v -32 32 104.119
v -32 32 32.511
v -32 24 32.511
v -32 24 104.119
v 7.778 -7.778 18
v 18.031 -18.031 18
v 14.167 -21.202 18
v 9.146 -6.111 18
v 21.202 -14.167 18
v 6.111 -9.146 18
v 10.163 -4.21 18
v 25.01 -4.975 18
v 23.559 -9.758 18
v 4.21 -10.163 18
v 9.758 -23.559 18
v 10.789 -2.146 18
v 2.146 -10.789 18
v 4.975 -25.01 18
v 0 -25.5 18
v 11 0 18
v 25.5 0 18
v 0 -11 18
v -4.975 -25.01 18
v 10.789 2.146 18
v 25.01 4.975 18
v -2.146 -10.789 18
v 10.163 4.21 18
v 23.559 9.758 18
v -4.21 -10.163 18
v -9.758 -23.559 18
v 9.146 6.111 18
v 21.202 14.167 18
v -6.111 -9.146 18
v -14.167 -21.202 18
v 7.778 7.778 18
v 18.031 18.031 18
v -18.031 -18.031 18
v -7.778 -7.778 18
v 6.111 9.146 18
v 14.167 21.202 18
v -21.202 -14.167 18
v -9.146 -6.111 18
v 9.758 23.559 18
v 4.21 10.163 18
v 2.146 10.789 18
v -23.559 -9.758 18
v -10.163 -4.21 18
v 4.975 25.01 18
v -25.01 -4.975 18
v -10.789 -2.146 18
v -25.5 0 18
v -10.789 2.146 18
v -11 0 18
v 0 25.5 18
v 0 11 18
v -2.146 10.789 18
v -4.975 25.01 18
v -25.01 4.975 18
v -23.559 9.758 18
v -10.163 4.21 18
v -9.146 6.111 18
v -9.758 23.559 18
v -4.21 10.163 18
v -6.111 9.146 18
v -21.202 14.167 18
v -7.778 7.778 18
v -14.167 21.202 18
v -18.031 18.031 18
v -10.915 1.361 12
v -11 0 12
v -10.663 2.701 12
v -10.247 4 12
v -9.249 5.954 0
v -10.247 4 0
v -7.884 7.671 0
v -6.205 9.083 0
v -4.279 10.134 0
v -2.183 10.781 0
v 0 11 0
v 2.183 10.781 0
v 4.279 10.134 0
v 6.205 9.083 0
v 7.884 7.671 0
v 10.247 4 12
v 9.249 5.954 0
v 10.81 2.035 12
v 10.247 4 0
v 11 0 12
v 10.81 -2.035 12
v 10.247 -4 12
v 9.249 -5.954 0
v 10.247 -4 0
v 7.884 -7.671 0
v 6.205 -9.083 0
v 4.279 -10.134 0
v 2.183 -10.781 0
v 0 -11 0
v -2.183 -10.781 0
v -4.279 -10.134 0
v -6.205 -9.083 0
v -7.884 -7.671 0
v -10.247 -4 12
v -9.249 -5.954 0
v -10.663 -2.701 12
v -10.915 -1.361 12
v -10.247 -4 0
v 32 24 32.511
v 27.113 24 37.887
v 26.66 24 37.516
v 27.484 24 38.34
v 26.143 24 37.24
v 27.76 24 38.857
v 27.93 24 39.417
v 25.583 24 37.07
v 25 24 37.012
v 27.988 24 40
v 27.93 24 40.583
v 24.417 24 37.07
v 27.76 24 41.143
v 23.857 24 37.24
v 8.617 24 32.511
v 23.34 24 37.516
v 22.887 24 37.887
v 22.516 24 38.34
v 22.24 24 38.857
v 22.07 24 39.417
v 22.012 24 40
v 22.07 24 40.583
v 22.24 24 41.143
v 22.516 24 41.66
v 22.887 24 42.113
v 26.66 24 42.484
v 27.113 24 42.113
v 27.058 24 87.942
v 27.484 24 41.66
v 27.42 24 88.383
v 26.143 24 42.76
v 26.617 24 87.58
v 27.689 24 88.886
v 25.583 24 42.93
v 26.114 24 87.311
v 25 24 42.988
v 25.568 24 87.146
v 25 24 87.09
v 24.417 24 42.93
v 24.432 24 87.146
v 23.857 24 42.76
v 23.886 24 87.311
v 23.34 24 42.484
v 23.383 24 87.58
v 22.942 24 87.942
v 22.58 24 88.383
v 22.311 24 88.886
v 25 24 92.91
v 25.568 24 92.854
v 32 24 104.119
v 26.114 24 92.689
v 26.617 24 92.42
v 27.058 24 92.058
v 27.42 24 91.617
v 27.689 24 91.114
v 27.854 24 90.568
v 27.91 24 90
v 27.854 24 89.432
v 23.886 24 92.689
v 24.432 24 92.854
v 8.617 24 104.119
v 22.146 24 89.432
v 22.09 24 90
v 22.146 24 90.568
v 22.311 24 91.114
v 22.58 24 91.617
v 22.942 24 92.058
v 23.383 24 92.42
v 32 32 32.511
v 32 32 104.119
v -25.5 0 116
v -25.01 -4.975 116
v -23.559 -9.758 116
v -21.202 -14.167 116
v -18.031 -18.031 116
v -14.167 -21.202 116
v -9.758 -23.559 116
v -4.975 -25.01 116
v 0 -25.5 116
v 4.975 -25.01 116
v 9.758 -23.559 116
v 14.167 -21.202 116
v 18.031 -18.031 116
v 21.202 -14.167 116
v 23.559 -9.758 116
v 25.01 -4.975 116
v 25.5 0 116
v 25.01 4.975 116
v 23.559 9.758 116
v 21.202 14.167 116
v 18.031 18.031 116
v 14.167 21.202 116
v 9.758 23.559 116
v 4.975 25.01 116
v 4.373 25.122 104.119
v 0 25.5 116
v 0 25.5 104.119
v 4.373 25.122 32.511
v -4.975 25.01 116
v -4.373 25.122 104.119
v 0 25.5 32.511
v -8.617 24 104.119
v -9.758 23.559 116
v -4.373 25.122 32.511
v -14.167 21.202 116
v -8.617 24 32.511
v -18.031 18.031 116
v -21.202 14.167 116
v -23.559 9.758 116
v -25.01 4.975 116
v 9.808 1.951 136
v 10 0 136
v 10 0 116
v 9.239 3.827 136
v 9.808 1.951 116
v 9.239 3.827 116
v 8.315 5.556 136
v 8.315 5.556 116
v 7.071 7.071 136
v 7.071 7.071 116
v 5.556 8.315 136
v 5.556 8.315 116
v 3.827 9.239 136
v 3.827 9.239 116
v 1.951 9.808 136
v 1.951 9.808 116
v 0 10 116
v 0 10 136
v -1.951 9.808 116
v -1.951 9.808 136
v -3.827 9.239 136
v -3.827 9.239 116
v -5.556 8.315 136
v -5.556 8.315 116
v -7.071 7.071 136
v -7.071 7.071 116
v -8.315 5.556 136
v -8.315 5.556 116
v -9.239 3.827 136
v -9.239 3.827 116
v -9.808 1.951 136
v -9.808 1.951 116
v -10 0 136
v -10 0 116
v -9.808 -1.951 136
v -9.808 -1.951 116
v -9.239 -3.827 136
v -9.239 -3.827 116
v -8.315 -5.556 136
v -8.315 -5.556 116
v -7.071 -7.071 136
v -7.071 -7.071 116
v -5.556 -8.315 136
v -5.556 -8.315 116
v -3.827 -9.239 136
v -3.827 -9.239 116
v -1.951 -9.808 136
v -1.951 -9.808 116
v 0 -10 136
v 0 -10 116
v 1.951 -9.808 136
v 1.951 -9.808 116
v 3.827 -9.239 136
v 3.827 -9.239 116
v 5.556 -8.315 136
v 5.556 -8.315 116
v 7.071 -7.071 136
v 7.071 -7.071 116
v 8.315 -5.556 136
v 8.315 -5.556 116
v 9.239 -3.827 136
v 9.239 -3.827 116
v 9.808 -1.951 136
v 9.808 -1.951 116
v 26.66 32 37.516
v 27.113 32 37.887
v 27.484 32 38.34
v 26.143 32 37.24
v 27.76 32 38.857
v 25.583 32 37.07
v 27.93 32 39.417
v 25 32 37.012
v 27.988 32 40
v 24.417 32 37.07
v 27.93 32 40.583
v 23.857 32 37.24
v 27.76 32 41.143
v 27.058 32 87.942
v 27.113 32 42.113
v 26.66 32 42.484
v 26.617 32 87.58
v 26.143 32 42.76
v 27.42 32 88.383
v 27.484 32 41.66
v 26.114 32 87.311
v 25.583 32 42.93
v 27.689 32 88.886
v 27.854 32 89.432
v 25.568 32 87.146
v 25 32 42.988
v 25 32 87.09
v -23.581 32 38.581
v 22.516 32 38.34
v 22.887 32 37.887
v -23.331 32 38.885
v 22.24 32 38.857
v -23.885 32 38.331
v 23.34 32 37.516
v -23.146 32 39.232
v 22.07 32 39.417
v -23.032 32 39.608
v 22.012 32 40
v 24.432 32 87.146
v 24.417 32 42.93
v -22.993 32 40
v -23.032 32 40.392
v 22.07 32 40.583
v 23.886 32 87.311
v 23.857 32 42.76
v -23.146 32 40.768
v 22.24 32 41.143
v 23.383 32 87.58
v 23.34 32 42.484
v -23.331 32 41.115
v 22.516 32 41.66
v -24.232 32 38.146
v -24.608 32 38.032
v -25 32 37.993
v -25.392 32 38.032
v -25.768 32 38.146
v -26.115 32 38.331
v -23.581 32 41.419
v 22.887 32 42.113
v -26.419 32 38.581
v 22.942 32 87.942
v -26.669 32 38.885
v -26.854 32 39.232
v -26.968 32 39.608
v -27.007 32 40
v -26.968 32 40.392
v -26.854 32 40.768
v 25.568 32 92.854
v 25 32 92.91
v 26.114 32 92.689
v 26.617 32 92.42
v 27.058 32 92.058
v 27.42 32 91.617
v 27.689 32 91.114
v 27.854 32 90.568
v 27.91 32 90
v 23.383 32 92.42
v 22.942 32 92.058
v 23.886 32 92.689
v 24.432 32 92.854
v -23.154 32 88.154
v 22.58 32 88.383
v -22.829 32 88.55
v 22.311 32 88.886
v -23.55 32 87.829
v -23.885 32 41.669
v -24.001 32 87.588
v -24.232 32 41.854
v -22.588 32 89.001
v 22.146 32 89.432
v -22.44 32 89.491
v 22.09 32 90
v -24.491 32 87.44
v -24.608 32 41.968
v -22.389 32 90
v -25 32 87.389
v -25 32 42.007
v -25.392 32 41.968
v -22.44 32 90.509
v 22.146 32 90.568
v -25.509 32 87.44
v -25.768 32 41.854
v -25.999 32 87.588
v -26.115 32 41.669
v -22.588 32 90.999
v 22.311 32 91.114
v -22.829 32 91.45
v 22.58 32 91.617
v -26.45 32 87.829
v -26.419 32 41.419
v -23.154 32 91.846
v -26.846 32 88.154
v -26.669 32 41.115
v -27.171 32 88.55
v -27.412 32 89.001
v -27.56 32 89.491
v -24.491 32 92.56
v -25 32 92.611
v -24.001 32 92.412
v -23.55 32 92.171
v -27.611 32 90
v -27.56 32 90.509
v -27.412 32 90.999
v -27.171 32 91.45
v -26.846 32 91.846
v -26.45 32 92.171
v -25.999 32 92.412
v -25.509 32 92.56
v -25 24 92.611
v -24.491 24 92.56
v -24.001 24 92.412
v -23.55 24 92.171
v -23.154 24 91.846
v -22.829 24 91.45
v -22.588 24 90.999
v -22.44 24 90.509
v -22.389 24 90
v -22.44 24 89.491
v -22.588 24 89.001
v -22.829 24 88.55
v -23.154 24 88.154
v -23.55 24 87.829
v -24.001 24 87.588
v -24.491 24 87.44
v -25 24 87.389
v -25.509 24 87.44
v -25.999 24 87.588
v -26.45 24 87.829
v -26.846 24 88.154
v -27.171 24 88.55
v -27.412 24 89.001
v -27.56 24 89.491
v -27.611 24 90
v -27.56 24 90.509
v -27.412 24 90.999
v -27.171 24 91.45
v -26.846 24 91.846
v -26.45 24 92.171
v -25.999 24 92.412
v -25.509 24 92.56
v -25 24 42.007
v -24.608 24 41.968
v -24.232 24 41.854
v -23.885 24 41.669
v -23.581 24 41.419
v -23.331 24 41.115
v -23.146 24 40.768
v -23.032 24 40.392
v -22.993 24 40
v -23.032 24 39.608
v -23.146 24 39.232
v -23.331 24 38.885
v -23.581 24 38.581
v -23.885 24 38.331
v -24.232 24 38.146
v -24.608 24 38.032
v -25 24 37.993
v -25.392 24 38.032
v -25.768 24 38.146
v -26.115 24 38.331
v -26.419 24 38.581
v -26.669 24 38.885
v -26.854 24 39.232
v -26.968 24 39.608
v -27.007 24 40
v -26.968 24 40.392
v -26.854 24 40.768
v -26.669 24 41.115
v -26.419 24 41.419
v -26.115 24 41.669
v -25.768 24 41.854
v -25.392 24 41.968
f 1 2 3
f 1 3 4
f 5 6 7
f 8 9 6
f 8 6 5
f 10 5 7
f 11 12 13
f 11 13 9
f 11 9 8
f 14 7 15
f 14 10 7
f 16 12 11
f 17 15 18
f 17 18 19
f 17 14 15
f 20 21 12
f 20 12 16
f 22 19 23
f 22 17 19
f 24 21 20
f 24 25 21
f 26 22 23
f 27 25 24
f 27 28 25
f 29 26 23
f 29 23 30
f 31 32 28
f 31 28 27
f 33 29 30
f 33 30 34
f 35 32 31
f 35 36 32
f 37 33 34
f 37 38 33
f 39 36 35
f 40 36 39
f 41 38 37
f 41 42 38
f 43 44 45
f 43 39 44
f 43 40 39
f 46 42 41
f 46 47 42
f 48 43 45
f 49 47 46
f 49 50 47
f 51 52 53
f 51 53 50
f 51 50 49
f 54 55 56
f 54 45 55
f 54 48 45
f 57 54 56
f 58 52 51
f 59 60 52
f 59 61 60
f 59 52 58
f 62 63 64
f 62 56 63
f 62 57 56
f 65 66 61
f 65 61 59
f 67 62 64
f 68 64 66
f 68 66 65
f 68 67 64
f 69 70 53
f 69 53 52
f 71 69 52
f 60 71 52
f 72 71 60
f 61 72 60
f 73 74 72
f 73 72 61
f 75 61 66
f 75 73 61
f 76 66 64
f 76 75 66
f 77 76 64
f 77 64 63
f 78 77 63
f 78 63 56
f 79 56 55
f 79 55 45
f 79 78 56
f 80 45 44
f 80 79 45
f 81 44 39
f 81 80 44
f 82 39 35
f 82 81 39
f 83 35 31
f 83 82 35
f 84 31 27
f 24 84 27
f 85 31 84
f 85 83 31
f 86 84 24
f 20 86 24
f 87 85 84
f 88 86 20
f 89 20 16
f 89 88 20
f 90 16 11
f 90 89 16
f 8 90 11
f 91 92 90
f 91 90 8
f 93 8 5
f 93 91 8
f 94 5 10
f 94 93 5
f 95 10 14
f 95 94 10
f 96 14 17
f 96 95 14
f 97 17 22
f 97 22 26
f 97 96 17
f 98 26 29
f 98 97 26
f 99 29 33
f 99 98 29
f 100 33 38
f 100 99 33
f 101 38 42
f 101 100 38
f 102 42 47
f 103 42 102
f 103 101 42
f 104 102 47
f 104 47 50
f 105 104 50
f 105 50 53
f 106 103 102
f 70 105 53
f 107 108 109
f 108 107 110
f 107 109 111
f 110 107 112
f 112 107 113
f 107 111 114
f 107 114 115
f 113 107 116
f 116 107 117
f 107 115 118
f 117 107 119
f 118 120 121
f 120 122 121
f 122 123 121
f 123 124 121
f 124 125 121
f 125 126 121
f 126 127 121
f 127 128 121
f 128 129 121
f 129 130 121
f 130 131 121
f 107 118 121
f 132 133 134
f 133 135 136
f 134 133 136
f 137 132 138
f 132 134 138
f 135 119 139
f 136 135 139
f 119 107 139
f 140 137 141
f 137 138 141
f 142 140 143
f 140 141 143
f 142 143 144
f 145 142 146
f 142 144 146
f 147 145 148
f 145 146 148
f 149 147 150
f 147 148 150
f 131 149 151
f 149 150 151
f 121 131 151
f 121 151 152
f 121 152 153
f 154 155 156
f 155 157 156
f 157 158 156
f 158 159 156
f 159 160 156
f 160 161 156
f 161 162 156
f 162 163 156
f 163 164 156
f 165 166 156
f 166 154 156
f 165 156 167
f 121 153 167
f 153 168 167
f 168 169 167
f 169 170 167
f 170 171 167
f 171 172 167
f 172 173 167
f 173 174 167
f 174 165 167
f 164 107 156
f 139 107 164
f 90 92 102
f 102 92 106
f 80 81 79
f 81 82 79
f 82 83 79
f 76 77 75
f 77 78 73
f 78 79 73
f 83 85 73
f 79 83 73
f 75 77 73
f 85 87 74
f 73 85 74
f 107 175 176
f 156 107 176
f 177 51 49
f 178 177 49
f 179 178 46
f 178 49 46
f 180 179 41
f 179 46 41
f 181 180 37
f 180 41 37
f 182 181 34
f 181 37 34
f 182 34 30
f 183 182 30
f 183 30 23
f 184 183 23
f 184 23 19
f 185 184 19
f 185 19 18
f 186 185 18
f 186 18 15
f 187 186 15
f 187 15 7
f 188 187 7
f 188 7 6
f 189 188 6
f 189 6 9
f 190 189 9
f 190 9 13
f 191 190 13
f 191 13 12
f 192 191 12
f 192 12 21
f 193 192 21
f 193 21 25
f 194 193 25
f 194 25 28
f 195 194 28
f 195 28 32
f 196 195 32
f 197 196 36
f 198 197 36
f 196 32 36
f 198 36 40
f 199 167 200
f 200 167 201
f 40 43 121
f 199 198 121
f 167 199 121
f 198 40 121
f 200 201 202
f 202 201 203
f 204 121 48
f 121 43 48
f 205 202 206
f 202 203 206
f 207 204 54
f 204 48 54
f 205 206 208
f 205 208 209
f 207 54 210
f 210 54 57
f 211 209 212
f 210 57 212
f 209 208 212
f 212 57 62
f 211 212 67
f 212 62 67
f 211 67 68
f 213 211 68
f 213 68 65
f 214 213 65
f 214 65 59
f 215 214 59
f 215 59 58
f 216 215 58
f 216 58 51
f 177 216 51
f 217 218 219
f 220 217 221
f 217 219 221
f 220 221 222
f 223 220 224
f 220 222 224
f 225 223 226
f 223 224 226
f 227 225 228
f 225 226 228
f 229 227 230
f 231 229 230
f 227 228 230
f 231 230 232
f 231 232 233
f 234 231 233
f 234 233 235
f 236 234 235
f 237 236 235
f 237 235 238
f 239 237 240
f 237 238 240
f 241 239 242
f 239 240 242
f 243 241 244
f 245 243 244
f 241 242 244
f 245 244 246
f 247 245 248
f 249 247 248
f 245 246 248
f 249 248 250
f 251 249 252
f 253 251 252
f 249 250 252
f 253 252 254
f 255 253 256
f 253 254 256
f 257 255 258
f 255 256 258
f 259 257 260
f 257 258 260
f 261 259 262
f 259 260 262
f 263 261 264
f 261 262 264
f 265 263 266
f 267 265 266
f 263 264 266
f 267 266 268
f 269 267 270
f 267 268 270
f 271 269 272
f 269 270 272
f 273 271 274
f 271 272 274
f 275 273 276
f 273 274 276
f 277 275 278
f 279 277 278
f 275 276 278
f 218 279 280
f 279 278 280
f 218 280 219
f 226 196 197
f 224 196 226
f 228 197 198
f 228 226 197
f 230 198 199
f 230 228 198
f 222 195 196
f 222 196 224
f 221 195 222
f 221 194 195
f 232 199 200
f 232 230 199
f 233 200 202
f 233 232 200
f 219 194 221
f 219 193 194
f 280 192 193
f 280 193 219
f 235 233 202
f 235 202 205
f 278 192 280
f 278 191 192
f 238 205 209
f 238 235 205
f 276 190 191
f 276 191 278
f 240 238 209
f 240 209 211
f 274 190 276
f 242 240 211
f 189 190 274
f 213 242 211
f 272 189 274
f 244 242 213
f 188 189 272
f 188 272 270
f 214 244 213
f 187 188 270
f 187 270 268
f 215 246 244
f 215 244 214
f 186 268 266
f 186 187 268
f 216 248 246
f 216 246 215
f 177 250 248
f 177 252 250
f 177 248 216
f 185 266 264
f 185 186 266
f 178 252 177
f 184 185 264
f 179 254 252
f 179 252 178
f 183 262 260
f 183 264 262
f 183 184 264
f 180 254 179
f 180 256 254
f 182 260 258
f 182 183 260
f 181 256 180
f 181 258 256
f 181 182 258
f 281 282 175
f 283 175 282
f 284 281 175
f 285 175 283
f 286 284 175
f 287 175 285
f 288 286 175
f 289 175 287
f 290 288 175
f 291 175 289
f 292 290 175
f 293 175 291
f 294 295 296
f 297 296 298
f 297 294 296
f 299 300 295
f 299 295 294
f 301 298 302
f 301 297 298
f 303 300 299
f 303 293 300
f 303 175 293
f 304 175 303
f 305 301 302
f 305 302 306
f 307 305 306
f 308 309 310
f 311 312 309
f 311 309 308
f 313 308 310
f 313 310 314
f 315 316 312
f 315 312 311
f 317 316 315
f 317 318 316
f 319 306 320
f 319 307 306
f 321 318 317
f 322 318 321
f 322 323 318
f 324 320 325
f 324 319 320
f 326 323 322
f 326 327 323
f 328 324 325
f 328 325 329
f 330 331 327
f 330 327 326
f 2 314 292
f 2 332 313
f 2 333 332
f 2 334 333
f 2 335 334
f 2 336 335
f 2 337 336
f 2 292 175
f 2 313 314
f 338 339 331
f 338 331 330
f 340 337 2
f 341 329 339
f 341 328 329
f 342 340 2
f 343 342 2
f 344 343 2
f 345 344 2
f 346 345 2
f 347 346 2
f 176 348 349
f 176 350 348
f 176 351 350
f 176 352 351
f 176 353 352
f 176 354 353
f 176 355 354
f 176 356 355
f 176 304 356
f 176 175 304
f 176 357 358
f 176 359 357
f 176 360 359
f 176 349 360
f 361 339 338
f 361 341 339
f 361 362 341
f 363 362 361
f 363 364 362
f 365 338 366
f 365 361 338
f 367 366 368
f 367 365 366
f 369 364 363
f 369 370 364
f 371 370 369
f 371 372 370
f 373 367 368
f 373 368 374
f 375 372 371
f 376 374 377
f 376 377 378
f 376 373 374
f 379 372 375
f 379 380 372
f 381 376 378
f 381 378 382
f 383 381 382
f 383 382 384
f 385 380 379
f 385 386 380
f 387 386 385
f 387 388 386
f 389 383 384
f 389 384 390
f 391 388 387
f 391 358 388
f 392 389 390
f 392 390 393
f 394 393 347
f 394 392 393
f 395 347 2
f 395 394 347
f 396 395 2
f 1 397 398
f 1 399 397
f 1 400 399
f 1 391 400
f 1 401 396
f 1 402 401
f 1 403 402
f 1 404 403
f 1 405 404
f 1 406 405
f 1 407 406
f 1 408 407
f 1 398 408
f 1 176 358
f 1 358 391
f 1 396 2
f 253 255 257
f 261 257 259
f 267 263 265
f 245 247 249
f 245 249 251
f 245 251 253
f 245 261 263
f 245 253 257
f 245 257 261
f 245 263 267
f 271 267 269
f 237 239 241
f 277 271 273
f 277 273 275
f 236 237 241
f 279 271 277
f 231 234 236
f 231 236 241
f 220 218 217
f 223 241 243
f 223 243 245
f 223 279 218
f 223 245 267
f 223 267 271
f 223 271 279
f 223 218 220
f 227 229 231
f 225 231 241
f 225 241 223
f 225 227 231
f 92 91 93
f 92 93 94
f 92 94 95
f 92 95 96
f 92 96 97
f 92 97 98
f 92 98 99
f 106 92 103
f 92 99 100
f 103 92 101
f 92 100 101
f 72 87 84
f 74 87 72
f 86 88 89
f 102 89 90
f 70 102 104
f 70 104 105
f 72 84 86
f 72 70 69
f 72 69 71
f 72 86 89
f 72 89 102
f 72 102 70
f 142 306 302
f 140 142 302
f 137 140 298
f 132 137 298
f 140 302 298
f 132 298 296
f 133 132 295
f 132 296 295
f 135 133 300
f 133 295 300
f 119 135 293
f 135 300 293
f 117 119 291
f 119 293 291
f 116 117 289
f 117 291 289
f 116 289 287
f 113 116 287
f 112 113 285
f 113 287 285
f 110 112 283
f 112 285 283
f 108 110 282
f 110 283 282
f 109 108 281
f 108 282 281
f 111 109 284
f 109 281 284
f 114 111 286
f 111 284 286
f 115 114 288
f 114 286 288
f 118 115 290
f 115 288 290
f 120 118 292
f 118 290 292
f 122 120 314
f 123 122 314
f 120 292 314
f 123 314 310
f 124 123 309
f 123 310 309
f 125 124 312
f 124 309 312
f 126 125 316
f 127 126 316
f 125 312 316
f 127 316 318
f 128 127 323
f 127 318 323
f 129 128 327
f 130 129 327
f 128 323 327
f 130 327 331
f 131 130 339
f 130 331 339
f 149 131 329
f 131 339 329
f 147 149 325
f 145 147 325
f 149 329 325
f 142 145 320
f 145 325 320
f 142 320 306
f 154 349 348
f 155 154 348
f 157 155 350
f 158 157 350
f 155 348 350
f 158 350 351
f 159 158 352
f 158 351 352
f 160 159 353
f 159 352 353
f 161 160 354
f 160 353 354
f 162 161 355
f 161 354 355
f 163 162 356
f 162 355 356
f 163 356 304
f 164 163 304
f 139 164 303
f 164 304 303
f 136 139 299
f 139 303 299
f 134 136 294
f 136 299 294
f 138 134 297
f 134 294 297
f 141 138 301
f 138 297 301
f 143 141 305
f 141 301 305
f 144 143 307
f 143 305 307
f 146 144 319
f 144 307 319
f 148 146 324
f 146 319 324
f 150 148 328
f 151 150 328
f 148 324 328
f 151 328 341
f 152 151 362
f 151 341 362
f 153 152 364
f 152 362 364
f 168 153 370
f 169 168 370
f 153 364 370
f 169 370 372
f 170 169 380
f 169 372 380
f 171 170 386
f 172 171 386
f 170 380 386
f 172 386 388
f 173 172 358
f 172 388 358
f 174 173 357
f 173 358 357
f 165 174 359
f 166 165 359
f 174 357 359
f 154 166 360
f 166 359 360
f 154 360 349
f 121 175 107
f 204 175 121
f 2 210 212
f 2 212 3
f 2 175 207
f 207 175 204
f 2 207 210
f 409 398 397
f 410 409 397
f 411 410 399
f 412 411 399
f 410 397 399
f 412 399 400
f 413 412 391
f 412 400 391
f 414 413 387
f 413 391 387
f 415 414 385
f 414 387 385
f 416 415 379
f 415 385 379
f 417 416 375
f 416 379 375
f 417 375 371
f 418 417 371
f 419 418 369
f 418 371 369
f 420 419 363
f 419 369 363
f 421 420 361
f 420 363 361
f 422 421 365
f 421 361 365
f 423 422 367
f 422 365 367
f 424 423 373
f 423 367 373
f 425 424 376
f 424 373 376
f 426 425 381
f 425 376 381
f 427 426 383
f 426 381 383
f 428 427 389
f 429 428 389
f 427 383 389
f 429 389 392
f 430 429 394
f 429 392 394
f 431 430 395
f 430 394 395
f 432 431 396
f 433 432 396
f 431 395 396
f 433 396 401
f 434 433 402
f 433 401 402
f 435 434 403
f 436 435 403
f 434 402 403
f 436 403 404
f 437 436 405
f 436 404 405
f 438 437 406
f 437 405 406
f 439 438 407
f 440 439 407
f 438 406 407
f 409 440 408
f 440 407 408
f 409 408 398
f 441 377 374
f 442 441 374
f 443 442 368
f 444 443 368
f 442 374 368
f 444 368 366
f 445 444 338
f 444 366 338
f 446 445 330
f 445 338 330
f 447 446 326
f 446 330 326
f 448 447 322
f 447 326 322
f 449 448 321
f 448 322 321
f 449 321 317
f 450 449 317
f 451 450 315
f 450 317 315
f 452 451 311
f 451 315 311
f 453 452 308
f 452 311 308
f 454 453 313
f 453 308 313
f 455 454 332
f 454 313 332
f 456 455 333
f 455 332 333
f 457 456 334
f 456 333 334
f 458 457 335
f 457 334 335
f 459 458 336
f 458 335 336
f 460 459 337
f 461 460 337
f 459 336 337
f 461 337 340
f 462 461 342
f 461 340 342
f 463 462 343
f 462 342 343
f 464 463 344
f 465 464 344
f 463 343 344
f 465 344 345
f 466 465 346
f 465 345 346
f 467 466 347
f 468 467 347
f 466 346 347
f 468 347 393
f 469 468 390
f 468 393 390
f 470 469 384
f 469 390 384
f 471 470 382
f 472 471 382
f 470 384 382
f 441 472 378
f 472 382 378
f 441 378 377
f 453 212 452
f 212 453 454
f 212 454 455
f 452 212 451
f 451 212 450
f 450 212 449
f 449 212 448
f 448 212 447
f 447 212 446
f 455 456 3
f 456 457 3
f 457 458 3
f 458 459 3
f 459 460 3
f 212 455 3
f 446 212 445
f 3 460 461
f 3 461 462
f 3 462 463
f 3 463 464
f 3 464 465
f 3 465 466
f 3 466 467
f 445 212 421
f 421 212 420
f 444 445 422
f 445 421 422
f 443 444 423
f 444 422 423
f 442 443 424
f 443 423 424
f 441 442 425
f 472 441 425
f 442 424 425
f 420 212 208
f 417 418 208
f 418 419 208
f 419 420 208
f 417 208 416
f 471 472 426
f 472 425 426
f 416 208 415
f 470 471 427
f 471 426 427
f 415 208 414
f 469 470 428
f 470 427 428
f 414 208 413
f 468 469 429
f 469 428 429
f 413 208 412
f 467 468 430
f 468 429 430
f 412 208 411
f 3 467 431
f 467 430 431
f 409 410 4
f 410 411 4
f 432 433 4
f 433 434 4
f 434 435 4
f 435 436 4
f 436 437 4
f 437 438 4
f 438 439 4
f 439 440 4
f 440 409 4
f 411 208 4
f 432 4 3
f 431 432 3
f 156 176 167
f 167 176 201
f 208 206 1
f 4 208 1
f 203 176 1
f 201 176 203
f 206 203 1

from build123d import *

# Parameters (mm, degrees)
SKETCH1_R           = 25.5
BOSS_EXTRUDE1_DEPTH = 116
SKETCH3_OUTSIDE_W   = 80.318
SKETCH3_OUTSIDE_H   = 80.318
SKETCH3_OUTSIDE_R   = 11
CUT_EXTRUDE2_DEPTH  = 18
SKETCH4_W           = 35.319317214
SKETCH4_H           = 8
CUT_EXTRUDE3_DEPTH  = 12
SKETCH5_W           = 64
SKETCH5_H           = 71.607933851
SKETCH5_R           = 2.910259783
SKETCH5_R_2         = 2.987781855
SKETCH5_R_3         = 2.610532629
SKETCH5_R_4         = 2.006978968
BOSS_EXTRUDE2_DEPTH = 8
SKETCH6_R           = 10
BOSS_EXTRUDE3_DEPTH = 20


with BuildPart() as part:
    # Sketch1 → Boss-Extrude1 (new body)
    with BuildSketch(Plane.XY):
        with Locations(Location((0, 0, 0), (0, 0, 180))):
            Circle(SKETCH1_R)
    extrude(amount=BOSS_EXTRUDE1_DEPTH)

    # Sketch3 outside → Cut-Extrude2 (cut)
    with BuildSketch(Plane(origin=(0, 0, 0), x_dir=(-1, 0, 0), z_dir=(0, 0, -1))):
        Rectangle(SKETCH3_OUTSIDE_W, SKETCH3_OUTSIDE_H)
        Circle(SKETCH3_OUTSIDE_R, mode=Mode.SUBTRACT)
    extrude(amount=-CUT_EXTRUDE2_DEPTH, mode=Mode.SUBTRACT)

    # Sketch4 → Cut-Extrude3 (cut)
    with BuildSketch(Plane(origin=(0, 0, 0), x_dir=(-1, 0, 0), z_dir=(0, 0, -1))):
        with Locations((-2.725981742, 0)):
            Rectangle(SKETCH4_W, SKETCH4_H)
    extrude(amount=-CUT_EXTRUDE3_DEPTH, mode=Mode.SUBTRACT)

    # Sketch5 → Boss-Extrude2 (add)
    with BuildSketch(Plane(origin=(0, 32, 0), x_dir=(-1, 0, 0), z_dir=(0, 1, 0))):
        with Locations((0, 68.315264107)):
            Rectangle(SKETCH5_W, SKETCH5_H)
        with Locations(Location((-25, 90, 0), (0, 0, 90))):
            Circle(SKETCH5_R, mode=Mode.SUBTRACT)
        with Locations(Location((-25, 40, 0), (0, 0, 90))):
            Circle(SKETCH5_R_2, mode=Mode.SUBTRACT)
        with Locations(Location((25, 90, 0), (0, 0, 90))):
            Circle(SKETCH5_R_3, mode=Mode.SUBTRACT)
        with Locations(Location((25, 40, 0), (0, 0, 90))):
            Circle(SKETCH5_R_4, mode=Mode.SUBTRACT)
    extrude(amount=-BOSS_EXTRUDE2_DEPTH)

    # Sketch6 → Boss-Extrude3 (add)
    with BuildSketch(Plane.XY.offset(116)):
        Circle(SKETCH6_R)
    extrude(amount=BOSS_EXTRUDE3_DEPTH)


solid = part.part
